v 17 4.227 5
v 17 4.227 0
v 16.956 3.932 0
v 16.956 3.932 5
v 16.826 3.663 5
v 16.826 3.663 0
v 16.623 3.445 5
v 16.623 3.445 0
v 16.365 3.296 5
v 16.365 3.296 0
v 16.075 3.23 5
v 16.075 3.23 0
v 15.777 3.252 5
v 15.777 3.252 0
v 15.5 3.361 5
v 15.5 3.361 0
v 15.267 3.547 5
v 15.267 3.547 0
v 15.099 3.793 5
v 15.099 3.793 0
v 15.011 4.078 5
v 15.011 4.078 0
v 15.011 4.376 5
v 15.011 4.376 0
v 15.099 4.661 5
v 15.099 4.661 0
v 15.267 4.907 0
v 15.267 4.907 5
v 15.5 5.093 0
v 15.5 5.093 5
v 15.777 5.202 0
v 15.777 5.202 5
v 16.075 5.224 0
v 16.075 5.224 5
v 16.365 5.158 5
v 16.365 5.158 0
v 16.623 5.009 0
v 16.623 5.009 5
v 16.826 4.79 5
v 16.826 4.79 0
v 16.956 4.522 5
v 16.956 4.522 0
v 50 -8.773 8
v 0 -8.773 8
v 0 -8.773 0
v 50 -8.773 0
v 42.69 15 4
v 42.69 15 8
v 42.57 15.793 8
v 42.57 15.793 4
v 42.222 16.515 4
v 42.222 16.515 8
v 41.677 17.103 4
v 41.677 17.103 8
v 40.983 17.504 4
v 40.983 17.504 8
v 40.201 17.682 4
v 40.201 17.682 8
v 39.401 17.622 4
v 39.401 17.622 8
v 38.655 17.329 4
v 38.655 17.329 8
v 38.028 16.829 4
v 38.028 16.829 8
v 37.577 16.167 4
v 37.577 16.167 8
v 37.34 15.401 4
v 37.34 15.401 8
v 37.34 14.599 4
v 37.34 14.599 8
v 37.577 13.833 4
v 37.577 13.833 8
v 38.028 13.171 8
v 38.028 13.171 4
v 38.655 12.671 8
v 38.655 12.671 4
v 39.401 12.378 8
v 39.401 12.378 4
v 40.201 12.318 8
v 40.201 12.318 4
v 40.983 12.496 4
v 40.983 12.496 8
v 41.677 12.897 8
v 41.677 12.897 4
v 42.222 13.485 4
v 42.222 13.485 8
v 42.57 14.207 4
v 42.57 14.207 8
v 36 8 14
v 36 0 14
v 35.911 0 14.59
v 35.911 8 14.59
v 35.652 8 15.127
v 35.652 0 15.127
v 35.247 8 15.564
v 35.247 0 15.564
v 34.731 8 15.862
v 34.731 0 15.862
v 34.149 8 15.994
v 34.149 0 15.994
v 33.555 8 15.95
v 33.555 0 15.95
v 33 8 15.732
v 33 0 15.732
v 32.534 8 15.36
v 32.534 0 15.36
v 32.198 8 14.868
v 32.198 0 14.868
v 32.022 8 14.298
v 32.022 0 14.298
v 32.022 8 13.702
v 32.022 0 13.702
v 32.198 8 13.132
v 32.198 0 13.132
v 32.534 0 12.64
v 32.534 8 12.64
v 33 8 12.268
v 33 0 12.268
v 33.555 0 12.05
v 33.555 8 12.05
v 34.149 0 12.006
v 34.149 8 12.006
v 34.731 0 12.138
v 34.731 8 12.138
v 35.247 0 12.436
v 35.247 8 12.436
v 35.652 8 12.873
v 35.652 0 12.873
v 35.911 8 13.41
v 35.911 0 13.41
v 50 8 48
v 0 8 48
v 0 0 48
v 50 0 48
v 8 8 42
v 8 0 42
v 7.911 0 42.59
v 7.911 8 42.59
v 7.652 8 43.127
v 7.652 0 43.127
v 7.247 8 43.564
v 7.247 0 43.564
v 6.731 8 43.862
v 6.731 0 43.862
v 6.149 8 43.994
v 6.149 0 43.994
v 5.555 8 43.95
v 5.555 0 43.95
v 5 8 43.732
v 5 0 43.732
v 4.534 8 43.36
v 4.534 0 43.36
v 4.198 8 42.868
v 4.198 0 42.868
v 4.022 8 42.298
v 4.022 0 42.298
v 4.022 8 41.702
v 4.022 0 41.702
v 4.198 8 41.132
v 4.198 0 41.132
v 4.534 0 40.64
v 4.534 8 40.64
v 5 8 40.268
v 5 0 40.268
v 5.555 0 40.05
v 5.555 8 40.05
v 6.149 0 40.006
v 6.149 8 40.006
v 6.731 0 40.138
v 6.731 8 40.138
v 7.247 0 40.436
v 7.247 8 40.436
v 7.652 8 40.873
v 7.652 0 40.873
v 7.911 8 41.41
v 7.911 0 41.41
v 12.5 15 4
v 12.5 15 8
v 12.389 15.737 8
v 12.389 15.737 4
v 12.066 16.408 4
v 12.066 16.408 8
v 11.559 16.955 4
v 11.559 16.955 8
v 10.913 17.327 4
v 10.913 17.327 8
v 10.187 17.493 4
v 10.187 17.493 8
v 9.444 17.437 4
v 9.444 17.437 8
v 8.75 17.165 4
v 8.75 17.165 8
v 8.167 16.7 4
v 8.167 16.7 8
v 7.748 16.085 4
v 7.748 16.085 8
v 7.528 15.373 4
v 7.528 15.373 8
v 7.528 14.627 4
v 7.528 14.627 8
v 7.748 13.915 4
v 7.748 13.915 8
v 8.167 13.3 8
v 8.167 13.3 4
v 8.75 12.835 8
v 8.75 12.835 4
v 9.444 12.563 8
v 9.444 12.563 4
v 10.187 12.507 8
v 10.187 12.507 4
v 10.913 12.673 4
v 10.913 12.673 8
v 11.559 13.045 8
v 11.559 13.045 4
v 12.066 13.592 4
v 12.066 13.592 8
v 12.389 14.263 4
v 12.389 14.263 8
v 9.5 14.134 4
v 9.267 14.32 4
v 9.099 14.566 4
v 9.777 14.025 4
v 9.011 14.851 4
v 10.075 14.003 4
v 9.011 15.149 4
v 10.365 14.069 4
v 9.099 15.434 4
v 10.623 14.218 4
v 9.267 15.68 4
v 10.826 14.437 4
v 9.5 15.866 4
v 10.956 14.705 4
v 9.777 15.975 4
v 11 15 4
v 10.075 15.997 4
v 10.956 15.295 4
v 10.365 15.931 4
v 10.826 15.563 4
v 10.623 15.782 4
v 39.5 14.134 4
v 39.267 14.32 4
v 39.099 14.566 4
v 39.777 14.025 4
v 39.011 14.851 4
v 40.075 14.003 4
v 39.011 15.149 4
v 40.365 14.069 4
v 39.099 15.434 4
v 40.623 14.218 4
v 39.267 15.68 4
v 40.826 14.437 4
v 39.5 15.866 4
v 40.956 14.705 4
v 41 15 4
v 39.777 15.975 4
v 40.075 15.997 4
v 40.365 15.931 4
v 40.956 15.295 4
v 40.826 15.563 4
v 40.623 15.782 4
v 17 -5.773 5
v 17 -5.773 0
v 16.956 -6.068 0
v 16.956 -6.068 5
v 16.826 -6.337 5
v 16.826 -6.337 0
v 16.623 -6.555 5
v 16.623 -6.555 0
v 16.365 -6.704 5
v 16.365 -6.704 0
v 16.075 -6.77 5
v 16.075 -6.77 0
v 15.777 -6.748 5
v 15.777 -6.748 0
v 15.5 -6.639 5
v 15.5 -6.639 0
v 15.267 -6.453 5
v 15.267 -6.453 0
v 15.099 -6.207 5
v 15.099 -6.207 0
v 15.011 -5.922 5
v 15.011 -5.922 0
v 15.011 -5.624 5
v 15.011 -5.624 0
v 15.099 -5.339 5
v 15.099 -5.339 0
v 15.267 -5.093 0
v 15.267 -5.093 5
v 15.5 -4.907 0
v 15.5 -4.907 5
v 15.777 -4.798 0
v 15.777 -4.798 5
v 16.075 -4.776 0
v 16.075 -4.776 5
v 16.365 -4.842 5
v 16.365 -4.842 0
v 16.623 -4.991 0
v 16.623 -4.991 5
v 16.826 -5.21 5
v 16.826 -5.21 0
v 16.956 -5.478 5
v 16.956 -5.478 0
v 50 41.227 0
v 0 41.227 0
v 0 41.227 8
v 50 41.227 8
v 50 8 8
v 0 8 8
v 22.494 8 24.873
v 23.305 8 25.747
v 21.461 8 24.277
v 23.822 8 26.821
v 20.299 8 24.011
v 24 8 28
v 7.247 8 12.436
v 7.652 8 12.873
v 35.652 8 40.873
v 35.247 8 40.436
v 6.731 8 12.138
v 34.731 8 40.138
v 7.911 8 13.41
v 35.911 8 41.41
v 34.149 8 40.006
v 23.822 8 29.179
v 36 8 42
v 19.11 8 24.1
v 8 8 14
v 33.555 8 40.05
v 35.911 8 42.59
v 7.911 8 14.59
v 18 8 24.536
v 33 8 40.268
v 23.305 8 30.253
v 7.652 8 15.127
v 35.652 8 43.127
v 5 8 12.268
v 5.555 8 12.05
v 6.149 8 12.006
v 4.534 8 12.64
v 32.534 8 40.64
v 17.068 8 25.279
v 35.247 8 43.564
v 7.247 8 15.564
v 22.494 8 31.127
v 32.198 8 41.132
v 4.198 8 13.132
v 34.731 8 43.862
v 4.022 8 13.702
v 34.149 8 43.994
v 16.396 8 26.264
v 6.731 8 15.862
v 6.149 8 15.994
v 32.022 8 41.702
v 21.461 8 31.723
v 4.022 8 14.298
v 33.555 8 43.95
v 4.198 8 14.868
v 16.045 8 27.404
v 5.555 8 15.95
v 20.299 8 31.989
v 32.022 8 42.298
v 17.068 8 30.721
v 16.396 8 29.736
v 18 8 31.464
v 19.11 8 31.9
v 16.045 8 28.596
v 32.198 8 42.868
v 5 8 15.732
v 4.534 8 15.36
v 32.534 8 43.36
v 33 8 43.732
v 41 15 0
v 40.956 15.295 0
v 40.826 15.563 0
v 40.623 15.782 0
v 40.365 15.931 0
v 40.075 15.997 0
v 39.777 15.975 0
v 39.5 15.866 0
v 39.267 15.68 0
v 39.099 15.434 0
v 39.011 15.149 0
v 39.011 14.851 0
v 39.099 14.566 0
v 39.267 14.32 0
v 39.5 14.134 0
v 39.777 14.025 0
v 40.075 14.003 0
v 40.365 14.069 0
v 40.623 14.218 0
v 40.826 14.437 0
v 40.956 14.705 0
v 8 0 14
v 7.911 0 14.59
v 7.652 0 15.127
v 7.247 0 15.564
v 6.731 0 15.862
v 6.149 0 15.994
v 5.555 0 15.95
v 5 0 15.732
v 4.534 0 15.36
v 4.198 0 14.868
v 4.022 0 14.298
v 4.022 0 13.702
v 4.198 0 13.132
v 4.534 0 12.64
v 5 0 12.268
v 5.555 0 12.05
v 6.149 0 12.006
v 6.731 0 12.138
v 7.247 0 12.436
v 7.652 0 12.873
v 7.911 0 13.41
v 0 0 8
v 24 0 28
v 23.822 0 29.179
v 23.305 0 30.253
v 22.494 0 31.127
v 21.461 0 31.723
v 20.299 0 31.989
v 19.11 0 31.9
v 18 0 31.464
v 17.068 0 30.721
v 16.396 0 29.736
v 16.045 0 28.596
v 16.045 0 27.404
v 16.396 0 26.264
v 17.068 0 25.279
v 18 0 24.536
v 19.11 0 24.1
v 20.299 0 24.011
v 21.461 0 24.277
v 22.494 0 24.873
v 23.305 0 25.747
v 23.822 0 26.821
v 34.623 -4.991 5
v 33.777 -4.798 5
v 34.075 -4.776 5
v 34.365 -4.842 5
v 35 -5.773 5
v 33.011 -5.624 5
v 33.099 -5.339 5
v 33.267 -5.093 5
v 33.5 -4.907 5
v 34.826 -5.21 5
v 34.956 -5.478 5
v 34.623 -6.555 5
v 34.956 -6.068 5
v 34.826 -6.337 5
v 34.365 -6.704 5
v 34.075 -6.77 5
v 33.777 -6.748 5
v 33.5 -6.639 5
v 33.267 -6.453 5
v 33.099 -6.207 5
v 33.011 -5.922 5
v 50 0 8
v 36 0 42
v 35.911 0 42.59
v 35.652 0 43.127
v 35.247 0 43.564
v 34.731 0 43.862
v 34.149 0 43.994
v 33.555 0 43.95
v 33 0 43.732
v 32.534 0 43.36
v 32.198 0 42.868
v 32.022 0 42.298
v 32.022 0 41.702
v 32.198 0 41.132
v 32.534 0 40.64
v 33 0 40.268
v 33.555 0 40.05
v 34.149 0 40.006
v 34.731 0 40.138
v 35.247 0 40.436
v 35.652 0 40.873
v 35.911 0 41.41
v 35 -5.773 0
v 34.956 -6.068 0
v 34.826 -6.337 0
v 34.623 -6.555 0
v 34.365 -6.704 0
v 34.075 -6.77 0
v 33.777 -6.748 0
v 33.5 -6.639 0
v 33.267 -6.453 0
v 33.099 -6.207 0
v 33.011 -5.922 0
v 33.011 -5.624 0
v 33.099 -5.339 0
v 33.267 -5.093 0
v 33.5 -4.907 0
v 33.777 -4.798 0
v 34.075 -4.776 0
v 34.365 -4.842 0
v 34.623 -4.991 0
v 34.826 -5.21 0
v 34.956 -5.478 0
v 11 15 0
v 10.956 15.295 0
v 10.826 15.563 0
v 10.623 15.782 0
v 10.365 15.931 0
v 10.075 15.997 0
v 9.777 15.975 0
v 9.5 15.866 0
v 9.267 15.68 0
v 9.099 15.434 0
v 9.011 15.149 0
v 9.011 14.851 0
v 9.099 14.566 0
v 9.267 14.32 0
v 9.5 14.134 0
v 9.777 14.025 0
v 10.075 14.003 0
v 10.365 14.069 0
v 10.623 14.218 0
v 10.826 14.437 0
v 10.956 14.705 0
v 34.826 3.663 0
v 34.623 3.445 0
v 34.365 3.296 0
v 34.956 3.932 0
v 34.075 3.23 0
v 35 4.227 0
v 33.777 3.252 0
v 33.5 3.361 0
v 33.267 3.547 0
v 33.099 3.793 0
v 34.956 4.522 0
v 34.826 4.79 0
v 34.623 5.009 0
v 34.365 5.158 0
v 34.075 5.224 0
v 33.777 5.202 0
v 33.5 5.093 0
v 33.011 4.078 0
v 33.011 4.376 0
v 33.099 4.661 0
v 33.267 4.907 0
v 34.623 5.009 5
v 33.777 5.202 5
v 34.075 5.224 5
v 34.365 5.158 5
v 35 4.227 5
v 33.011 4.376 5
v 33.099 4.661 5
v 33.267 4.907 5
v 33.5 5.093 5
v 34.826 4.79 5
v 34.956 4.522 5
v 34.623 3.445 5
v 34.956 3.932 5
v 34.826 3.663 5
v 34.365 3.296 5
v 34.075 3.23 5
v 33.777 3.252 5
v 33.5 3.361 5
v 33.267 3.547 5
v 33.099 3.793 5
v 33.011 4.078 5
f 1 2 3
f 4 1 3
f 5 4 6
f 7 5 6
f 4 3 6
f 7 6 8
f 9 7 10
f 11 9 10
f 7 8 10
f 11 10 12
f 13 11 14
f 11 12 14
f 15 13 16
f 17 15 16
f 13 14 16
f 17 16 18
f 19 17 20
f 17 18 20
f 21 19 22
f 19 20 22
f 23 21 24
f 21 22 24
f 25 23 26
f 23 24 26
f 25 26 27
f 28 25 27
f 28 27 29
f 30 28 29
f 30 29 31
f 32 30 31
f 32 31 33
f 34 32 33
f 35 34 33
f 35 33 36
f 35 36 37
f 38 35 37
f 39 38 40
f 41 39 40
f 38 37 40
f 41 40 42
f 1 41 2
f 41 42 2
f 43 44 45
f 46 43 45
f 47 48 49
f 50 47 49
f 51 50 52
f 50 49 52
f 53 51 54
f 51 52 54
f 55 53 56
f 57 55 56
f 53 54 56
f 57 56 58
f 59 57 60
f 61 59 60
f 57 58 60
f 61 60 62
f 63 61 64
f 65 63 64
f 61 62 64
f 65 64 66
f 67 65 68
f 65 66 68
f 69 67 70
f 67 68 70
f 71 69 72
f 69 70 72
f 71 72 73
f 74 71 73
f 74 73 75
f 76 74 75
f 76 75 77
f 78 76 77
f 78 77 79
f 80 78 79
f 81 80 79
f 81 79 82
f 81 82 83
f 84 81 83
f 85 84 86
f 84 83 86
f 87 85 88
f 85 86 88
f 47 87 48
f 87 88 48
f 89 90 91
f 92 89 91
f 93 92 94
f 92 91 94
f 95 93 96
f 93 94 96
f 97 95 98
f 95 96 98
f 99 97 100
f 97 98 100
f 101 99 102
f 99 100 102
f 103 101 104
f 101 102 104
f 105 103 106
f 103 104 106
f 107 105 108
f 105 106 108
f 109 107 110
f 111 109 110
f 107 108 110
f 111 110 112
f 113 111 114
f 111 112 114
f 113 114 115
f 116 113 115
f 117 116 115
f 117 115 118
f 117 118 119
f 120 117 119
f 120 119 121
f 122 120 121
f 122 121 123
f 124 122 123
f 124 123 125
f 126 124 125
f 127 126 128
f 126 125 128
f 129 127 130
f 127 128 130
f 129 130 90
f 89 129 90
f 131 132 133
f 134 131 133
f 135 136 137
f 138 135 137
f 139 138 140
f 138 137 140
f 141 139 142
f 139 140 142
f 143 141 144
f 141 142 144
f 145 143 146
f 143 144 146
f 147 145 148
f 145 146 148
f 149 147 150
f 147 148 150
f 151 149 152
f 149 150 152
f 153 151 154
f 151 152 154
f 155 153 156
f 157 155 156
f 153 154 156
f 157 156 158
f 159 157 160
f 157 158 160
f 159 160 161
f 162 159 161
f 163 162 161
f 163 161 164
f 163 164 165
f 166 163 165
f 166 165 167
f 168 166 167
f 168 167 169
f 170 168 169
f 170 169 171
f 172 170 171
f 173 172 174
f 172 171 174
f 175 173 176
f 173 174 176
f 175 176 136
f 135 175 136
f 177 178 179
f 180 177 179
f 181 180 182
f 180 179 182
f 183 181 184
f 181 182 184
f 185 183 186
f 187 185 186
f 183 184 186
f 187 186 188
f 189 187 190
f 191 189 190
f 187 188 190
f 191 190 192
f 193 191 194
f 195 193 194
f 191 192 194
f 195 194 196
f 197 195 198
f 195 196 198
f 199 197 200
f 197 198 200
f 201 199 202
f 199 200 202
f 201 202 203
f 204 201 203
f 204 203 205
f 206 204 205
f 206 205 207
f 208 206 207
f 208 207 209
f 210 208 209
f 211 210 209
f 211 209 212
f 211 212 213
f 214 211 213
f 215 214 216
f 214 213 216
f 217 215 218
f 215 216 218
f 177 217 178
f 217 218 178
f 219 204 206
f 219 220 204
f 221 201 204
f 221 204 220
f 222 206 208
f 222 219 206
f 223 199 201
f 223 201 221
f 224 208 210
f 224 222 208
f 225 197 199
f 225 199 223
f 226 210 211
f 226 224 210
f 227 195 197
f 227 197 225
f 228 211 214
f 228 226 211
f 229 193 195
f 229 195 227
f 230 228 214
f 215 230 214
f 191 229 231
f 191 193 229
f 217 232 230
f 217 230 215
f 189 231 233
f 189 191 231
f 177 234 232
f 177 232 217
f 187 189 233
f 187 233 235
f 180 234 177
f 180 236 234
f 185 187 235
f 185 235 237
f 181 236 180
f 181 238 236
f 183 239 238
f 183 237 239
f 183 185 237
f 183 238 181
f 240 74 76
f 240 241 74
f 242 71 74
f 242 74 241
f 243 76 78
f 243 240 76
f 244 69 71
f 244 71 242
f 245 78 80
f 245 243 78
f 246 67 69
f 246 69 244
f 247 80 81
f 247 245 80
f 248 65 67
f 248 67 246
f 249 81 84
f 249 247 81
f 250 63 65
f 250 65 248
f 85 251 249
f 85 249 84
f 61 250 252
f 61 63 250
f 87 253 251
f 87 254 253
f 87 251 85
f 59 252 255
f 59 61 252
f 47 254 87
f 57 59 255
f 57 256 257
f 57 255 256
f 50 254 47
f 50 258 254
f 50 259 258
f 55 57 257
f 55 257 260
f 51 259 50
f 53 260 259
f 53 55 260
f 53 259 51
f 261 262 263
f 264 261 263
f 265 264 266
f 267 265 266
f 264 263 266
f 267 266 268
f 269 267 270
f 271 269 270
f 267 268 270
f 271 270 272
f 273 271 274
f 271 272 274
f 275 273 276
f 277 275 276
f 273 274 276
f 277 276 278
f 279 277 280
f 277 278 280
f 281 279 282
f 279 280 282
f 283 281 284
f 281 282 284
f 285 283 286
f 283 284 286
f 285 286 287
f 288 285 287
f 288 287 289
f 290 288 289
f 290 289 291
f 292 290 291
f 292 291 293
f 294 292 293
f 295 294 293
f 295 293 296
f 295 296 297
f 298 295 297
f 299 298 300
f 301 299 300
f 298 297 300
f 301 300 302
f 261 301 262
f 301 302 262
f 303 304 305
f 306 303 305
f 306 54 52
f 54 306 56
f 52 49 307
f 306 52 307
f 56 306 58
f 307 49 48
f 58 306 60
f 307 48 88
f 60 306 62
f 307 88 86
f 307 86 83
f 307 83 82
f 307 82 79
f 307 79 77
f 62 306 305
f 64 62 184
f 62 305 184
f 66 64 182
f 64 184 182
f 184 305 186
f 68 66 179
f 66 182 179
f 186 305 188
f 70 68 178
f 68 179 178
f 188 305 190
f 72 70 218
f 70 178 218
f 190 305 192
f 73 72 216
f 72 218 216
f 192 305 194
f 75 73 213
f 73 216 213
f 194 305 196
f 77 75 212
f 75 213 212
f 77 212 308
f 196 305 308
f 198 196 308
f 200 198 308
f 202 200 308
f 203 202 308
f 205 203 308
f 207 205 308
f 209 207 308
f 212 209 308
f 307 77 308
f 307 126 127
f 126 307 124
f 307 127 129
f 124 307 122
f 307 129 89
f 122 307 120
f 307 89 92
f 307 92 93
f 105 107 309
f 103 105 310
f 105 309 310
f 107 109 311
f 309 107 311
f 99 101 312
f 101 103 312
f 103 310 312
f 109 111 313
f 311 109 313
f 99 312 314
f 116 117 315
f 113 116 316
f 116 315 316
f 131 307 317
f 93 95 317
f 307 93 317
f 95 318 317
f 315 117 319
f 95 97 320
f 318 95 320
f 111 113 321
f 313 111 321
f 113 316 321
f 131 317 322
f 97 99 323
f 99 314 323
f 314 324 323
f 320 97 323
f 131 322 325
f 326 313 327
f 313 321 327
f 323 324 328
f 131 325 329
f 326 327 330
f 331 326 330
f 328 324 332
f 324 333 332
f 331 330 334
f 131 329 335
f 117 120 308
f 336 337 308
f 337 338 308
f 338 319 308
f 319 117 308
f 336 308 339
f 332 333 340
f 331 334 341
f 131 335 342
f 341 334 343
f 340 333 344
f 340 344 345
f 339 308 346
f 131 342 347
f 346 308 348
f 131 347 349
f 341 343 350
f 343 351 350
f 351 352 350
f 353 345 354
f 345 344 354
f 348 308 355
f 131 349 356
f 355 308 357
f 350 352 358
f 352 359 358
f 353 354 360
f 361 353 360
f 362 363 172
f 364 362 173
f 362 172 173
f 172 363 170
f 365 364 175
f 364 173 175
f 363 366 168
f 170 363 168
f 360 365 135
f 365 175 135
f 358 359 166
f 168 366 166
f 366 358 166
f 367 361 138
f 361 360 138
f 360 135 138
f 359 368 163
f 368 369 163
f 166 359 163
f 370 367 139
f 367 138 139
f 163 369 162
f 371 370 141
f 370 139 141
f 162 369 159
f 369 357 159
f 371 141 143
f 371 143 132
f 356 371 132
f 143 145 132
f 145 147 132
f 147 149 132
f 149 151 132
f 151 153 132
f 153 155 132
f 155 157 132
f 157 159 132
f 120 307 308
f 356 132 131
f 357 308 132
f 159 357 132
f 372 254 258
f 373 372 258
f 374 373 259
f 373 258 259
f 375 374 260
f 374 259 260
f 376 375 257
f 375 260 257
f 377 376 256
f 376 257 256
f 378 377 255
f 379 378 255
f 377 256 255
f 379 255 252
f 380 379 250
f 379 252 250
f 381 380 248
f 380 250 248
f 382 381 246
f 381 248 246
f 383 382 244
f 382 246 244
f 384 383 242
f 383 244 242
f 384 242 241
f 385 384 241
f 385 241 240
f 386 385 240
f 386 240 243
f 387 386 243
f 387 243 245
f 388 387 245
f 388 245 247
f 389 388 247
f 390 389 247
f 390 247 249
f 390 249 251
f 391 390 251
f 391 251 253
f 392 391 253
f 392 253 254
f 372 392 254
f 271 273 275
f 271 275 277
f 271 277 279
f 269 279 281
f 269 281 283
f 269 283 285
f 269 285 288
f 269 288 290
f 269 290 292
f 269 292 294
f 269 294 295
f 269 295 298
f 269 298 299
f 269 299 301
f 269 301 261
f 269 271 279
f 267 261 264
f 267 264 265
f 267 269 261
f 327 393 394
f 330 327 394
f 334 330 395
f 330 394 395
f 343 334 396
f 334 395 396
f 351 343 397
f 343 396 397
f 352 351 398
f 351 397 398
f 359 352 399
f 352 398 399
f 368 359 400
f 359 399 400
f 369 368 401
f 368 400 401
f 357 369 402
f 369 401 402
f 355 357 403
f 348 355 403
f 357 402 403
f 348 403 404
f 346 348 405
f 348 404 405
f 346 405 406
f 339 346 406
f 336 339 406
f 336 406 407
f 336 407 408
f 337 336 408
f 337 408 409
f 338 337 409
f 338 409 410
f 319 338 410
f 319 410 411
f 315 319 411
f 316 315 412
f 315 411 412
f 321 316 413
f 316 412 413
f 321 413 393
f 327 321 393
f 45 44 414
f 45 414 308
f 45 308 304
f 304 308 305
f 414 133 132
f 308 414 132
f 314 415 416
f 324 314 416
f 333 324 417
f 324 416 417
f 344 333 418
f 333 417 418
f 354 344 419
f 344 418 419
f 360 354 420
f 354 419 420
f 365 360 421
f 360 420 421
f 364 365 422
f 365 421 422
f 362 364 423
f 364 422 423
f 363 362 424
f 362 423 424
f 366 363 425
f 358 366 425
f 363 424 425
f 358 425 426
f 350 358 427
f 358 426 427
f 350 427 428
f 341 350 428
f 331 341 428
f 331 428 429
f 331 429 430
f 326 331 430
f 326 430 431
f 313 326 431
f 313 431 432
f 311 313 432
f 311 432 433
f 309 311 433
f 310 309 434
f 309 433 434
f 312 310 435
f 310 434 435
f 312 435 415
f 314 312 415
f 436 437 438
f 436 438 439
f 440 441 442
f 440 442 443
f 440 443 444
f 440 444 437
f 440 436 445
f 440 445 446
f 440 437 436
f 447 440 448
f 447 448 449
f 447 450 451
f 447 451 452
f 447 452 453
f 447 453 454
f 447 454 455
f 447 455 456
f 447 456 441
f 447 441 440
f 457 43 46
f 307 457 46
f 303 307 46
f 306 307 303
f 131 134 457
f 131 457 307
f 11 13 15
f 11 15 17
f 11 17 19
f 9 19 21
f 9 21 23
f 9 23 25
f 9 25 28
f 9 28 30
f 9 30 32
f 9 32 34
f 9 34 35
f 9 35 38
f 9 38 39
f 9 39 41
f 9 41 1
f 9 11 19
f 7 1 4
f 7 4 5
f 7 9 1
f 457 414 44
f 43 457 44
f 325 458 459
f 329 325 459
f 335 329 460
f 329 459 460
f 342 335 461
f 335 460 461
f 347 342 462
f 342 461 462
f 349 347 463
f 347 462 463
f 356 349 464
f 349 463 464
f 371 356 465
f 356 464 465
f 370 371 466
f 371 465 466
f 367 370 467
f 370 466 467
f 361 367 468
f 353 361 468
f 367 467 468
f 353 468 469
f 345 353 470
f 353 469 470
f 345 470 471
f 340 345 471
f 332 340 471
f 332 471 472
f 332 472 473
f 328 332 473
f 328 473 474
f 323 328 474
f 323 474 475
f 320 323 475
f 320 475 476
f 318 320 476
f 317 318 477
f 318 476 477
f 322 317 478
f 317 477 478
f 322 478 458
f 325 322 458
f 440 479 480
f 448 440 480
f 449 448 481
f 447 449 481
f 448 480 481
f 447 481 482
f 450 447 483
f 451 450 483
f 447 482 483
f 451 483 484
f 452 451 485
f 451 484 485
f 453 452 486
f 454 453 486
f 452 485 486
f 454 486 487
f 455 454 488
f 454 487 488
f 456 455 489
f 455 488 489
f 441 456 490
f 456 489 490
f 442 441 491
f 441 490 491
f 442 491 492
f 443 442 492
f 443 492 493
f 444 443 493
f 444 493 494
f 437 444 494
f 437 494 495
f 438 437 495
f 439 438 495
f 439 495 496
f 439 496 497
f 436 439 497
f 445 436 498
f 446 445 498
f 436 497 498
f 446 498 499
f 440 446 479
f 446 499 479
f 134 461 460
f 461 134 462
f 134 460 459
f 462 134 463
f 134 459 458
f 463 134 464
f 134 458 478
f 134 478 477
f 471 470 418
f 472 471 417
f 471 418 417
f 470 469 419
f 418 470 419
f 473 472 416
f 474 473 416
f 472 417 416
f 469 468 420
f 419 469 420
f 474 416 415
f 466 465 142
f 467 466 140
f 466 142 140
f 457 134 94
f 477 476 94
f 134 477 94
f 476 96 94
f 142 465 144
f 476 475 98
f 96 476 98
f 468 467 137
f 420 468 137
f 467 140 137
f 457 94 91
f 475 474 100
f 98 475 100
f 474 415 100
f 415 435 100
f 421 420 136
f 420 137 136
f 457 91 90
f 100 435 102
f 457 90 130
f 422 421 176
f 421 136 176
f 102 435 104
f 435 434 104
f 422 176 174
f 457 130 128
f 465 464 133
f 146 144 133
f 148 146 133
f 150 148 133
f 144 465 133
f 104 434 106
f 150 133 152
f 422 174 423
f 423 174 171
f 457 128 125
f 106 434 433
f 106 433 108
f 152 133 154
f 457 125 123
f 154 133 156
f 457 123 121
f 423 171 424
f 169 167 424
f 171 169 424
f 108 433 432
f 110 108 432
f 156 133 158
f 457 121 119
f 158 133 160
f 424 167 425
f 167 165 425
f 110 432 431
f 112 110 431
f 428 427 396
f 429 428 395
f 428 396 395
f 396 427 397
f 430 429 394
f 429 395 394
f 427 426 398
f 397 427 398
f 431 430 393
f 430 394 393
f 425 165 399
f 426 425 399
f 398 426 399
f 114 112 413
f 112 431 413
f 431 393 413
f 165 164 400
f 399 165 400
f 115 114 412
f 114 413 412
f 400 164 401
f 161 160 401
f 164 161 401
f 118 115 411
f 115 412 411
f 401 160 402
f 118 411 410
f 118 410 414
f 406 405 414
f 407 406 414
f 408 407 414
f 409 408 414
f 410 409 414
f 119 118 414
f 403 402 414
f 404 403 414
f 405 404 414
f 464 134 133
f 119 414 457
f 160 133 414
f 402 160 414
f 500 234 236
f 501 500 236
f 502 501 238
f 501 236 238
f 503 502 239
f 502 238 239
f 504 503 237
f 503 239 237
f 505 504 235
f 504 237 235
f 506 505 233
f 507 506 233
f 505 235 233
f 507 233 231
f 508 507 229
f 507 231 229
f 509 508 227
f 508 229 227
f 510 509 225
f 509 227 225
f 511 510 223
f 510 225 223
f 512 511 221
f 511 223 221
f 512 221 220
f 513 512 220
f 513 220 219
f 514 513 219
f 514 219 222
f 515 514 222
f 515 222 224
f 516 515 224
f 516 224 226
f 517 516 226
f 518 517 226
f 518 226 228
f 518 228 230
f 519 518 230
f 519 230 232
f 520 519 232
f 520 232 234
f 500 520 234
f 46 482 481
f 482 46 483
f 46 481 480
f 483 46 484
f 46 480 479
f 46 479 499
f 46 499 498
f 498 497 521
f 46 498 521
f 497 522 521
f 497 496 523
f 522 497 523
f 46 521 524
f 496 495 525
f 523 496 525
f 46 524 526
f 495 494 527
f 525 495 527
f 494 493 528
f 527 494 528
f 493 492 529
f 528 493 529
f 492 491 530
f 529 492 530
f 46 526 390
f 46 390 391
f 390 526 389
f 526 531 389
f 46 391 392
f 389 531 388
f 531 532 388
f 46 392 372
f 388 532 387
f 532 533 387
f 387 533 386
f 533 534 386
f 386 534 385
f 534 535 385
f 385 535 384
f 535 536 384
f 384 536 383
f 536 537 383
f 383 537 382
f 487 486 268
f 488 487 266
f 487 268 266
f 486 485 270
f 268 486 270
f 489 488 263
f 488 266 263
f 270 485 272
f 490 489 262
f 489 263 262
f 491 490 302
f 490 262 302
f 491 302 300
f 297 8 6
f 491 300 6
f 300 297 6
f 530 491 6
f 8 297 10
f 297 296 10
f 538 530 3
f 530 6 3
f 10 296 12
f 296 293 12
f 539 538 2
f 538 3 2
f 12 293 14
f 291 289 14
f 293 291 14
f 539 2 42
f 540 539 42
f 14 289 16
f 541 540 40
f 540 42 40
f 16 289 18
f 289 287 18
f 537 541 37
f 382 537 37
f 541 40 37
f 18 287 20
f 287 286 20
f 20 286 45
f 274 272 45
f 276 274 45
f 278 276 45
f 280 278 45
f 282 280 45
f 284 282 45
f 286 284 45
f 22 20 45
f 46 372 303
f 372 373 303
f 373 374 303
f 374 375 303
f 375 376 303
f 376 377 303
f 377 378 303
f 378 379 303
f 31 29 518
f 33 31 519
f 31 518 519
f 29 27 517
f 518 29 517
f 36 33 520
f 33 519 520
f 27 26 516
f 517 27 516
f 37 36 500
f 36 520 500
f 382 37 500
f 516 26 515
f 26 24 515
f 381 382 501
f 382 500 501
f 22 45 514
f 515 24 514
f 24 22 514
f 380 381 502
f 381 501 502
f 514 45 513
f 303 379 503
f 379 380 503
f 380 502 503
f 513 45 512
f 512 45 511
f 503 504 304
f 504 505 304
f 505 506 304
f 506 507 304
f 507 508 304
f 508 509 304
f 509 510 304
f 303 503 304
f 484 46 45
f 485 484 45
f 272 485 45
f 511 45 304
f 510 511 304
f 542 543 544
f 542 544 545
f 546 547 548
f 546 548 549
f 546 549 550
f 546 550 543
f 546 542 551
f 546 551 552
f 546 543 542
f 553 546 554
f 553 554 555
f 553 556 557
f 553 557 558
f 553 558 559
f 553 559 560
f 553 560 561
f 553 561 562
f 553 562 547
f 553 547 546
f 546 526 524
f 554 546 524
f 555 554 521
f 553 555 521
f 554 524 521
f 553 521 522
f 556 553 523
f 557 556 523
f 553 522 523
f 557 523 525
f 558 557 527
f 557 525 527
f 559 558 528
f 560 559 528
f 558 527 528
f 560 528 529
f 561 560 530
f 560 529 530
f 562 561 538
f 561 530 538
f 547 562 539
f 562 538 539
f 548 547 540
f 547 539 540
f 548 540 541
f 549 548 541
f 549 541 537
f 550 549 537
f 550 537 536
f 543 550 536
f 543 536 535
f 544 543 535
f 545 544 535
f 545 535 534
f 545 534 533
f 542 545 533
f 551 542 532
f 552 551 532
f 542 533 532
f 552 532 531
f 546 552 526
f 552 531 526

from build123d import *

# Parameters (mm, degrees)
F1_DEPTH = 50
F2_R     = 2
F2_R_2   = 4
F3_DEPTH = 8
F4_R     = 1
F5_DEPTH = 5
F6_R     = 1
F7_DEPTH = 8
F8_R     = 2.5
F8_R_2   = 1
F8_R_3   = 2.689756
F9_DEPTH = 4


with BuildPart() as f1:
    # F0 (on Right) → F1 (new body)
    with BuildSketch(Plane.YZ):
        Polygon((-8.773239, 0), (41.226761, 0), (41.226761, 8), (8, 8), (8, 48), (0, 48), (0, 8), (-8.773239, 8), align=None)
    extrude(amount=F1_DEPTH)

    # F2 (on face) → F3 (cut, through all)
    with BuildSketch(Plane.XZ):
        with Locations((6, 42)):
            Circle(F2_R)
        with Locations((6, 14)):
            Circle(F2_R)
        with Locations((20, 28)):
            Circle(F2_R_2)
        with Locations((34, 42)):
            Circle(F2_R)
        with Locations((34, 14)):
            Circle(F2_R)
    extrude(amount=-F3_DEPTH, mode=Mode.SUBTRACT)

    # F4 (on face) → F5 (cut)
    with BuildSketch(Plane(origin=(0, 0, 0), x_dir=(1, 0, 0), z_dir=(0, 0, -1))):
        with Locations((16, 5.773239)):
            Circle(F4_R)
        with Locations((34, 5.773239)):
            Circle(F4_R)
        with Locations((34, -4.226761)):
            Circle(F4_R)
        with Locations((16, -4.226761)):
            Circle(F4_R)
    extrude(amount=-F5_DEPTH, mode=Mode.SUBTRACT)

    # F6 (on face) → F7 (cut, through all)
    with BuildSketch(Plane.XY.offset(8)):
        with Locations((10, 15)):
            Circle(F6_R)
        with Locations((40, 15)):
            Circle(F6_R)
    extrude(amount=-F7_DEPTH, mode=Mode.SUBTRACT)

    # F8 (on face) → F9 (cut)
    with BuildSketch(Plane.XY.offset(8)):
        with Locations((10, 15)):
            Circle(F8_R)
        with Locations((10, 15)):
            Circle(F8_R_2, mode=Mode.SUBTRACT)
        with Locations((40, 15)):
            Circle(F8_R_3)
        with Locations((40, 15)):
            Circle(F8_R_2, mode=Mode.SUBTRACT)
    extrude(amount=-F9_DEPTH, mode=Mode.SUBTRACT)


solid = f1.part
